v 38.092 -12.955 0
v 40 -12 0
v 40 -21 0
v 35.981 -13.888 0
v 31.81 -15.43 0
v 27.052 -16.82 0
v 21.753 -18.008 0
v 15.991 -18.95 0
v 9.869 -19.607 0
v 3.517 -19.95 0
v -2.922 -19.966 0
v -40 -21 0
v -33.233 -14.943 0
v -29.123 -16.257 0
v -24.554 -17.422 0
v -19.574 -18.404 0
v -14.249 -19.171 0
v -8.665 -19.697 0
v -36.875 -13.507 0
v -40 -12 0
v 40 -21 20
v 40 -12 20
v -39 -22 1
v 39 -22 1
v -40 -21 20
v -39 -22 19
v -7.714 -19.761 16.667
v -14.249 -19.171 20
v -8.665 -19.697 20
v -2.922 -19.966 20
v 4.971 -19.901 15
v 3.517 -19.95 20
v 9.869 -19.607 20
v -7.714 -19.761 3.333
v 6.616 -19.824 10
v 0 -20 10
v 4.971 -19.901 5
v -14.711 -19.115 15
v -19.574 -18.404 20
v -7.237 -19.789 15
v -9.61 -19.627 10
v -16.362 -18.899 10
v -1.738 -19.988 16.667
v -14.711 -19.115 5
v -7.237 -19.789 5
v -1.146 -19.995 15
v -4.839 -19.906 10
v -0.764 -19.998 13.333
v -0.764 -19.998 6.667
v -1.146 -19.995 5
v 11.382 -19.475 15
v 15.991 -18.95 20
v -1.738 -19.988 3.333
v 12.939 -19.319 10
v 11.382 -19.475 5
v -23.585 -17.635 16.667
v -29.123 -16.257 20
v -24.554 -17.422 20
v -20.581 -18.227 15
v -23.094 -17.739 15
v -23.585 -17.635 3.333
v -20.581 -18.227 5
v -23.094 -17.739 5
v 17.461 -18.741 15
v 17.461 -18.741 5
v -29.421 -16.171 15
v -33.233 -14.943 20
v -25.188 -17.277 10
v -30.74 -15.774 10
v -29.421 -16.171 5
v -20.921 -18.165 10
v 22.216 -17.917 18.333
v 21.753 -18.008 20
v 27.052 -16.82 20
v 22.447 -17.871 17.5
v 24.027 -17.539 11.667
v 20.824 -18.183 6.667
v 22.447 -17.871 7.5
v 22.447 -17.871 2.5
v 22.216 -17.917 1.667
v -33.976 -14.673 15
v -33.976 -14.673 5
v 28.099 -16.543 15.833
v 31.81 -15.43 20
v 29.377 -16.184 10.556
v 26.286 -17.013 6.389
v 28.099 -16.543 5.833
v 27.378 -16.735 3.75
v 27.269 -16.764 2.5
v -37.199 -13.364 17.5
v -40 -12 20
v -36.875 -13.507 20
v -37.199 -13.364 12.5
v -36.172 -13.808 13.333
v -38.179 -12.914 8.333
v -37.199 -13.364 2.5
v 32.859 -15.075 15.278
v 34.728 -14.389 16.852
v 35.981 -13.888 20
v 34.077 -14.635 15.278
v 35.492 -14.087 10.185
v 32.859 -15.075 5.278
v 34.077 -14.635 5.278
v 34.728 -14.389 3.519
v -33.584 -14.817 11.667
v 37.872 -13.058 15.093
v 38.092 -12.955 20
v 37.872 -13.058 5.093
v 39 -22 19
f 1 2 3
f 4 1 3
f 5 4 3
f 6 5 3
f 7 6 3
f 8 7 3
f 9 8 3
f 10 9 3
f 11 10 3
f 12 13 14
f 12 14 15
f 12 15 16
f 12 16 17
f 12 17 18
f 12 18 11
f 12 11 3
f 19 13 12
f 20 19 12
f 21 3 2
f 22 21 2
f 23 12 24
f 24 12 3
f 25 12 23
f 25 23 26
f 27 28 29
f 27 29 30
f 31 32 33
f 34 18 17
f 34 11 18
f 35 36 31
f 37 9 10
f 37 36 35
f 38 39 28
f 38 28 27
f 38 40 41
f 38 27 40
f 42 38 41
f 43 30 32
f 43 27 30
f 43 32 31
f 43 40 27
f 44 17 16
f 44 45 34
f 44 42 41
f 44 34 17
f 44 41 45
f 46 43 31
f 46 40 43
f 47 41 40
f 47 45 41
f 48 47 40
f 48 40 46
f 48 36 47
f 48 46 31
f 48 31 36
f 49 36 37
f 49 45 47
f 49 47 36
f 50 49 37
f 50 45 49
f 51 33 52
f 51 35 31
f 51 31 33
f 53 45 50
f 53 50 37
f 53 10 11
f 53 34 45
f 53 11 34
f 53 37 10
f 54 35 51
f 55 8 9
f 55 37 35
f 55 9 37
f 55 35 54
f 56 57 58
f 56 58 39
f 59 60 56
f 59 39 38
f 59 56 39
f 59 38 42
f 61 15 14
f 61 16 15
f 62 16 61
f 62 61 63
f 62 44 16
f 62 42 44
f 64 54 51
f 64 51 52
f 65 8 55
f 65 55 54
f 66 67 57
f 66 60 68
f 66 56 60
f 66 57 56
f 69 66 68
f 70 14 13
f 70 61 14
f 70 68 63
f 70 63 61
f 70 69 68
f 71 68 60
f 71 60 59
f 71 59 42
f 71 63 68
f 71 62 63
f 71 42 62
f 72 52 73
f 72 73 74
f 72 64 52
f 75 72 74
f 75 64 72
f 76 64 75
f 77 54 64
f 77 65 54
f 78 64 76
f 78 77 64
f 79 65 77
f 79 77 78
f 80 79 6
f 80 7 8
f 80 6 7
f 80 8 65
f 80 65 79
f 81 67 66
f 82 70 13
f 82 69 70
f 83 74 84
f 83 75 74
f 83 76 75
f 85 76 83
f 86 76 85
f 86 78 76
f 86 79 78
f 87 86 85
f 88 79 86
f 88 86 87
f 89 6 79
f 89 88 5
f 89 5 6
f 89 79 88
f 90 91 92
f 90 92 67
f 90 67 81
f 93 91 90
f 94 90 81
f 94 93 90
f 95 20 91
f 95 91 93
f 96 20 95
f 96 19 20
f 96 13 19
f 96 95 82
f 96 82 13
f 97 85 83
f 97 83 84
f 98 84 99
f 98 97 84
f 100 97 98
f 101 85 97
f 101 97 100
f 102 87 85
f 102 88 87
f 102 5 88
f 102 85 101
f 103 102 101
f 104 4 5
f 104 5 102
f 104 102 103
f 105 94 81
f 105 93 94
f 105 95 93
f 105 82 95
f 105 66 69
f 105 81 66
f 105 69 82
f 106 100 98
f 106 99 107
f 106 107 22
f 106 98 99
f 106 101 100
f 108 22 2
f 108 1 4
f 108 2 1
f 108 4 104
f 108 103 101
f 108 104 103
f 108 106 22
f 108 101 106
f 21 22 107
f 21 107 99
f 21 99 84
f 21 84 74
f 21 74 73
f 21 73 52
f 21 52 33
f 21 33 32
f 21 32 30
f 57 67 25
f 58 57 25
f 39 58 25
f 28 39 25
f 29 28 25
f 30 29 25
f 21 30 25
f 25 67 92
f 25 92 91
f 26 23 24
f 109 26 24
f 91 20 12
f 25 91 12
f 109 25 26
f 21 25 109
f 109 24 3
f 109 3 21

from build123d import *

# Parameters (mm, degrees)
F1_DEPTH = 20
F2_SIZE  = 1


with BuildPart() as f1:
    # F0 (on Top) → F1 (new body)
    with BuildSketch(Plane.XY):
        with BuildLine():
            add(Edge.make_bspline(
                [(-40, -12), (0, -33.3333333333), (40, -12)],
                knots=[3.7850937624, 3.7850937624, 3.7850937624, 5.6396841984, 5.6396841984, 5.6396841984], degree=2, weights=[1, 0.6, 1]))
            Line((-40, -12), (-40, -22))
            Line((-40, -22), (40, -22))
            Line((40, -22), (40, -12))
        make_face()
    extrude(amount=F1_DEPTH)

    # F2
    f2_edges = [f1.edges().sort_by_distance(p)[0] for p in [
        (-40, -22, 10),
        (0, -22, 20),
        (0, -22, 0),
        (40, -22, 10),
    ]]
    chamfer(f2_edges, length=F2_SIZE)


solid = f1.part
